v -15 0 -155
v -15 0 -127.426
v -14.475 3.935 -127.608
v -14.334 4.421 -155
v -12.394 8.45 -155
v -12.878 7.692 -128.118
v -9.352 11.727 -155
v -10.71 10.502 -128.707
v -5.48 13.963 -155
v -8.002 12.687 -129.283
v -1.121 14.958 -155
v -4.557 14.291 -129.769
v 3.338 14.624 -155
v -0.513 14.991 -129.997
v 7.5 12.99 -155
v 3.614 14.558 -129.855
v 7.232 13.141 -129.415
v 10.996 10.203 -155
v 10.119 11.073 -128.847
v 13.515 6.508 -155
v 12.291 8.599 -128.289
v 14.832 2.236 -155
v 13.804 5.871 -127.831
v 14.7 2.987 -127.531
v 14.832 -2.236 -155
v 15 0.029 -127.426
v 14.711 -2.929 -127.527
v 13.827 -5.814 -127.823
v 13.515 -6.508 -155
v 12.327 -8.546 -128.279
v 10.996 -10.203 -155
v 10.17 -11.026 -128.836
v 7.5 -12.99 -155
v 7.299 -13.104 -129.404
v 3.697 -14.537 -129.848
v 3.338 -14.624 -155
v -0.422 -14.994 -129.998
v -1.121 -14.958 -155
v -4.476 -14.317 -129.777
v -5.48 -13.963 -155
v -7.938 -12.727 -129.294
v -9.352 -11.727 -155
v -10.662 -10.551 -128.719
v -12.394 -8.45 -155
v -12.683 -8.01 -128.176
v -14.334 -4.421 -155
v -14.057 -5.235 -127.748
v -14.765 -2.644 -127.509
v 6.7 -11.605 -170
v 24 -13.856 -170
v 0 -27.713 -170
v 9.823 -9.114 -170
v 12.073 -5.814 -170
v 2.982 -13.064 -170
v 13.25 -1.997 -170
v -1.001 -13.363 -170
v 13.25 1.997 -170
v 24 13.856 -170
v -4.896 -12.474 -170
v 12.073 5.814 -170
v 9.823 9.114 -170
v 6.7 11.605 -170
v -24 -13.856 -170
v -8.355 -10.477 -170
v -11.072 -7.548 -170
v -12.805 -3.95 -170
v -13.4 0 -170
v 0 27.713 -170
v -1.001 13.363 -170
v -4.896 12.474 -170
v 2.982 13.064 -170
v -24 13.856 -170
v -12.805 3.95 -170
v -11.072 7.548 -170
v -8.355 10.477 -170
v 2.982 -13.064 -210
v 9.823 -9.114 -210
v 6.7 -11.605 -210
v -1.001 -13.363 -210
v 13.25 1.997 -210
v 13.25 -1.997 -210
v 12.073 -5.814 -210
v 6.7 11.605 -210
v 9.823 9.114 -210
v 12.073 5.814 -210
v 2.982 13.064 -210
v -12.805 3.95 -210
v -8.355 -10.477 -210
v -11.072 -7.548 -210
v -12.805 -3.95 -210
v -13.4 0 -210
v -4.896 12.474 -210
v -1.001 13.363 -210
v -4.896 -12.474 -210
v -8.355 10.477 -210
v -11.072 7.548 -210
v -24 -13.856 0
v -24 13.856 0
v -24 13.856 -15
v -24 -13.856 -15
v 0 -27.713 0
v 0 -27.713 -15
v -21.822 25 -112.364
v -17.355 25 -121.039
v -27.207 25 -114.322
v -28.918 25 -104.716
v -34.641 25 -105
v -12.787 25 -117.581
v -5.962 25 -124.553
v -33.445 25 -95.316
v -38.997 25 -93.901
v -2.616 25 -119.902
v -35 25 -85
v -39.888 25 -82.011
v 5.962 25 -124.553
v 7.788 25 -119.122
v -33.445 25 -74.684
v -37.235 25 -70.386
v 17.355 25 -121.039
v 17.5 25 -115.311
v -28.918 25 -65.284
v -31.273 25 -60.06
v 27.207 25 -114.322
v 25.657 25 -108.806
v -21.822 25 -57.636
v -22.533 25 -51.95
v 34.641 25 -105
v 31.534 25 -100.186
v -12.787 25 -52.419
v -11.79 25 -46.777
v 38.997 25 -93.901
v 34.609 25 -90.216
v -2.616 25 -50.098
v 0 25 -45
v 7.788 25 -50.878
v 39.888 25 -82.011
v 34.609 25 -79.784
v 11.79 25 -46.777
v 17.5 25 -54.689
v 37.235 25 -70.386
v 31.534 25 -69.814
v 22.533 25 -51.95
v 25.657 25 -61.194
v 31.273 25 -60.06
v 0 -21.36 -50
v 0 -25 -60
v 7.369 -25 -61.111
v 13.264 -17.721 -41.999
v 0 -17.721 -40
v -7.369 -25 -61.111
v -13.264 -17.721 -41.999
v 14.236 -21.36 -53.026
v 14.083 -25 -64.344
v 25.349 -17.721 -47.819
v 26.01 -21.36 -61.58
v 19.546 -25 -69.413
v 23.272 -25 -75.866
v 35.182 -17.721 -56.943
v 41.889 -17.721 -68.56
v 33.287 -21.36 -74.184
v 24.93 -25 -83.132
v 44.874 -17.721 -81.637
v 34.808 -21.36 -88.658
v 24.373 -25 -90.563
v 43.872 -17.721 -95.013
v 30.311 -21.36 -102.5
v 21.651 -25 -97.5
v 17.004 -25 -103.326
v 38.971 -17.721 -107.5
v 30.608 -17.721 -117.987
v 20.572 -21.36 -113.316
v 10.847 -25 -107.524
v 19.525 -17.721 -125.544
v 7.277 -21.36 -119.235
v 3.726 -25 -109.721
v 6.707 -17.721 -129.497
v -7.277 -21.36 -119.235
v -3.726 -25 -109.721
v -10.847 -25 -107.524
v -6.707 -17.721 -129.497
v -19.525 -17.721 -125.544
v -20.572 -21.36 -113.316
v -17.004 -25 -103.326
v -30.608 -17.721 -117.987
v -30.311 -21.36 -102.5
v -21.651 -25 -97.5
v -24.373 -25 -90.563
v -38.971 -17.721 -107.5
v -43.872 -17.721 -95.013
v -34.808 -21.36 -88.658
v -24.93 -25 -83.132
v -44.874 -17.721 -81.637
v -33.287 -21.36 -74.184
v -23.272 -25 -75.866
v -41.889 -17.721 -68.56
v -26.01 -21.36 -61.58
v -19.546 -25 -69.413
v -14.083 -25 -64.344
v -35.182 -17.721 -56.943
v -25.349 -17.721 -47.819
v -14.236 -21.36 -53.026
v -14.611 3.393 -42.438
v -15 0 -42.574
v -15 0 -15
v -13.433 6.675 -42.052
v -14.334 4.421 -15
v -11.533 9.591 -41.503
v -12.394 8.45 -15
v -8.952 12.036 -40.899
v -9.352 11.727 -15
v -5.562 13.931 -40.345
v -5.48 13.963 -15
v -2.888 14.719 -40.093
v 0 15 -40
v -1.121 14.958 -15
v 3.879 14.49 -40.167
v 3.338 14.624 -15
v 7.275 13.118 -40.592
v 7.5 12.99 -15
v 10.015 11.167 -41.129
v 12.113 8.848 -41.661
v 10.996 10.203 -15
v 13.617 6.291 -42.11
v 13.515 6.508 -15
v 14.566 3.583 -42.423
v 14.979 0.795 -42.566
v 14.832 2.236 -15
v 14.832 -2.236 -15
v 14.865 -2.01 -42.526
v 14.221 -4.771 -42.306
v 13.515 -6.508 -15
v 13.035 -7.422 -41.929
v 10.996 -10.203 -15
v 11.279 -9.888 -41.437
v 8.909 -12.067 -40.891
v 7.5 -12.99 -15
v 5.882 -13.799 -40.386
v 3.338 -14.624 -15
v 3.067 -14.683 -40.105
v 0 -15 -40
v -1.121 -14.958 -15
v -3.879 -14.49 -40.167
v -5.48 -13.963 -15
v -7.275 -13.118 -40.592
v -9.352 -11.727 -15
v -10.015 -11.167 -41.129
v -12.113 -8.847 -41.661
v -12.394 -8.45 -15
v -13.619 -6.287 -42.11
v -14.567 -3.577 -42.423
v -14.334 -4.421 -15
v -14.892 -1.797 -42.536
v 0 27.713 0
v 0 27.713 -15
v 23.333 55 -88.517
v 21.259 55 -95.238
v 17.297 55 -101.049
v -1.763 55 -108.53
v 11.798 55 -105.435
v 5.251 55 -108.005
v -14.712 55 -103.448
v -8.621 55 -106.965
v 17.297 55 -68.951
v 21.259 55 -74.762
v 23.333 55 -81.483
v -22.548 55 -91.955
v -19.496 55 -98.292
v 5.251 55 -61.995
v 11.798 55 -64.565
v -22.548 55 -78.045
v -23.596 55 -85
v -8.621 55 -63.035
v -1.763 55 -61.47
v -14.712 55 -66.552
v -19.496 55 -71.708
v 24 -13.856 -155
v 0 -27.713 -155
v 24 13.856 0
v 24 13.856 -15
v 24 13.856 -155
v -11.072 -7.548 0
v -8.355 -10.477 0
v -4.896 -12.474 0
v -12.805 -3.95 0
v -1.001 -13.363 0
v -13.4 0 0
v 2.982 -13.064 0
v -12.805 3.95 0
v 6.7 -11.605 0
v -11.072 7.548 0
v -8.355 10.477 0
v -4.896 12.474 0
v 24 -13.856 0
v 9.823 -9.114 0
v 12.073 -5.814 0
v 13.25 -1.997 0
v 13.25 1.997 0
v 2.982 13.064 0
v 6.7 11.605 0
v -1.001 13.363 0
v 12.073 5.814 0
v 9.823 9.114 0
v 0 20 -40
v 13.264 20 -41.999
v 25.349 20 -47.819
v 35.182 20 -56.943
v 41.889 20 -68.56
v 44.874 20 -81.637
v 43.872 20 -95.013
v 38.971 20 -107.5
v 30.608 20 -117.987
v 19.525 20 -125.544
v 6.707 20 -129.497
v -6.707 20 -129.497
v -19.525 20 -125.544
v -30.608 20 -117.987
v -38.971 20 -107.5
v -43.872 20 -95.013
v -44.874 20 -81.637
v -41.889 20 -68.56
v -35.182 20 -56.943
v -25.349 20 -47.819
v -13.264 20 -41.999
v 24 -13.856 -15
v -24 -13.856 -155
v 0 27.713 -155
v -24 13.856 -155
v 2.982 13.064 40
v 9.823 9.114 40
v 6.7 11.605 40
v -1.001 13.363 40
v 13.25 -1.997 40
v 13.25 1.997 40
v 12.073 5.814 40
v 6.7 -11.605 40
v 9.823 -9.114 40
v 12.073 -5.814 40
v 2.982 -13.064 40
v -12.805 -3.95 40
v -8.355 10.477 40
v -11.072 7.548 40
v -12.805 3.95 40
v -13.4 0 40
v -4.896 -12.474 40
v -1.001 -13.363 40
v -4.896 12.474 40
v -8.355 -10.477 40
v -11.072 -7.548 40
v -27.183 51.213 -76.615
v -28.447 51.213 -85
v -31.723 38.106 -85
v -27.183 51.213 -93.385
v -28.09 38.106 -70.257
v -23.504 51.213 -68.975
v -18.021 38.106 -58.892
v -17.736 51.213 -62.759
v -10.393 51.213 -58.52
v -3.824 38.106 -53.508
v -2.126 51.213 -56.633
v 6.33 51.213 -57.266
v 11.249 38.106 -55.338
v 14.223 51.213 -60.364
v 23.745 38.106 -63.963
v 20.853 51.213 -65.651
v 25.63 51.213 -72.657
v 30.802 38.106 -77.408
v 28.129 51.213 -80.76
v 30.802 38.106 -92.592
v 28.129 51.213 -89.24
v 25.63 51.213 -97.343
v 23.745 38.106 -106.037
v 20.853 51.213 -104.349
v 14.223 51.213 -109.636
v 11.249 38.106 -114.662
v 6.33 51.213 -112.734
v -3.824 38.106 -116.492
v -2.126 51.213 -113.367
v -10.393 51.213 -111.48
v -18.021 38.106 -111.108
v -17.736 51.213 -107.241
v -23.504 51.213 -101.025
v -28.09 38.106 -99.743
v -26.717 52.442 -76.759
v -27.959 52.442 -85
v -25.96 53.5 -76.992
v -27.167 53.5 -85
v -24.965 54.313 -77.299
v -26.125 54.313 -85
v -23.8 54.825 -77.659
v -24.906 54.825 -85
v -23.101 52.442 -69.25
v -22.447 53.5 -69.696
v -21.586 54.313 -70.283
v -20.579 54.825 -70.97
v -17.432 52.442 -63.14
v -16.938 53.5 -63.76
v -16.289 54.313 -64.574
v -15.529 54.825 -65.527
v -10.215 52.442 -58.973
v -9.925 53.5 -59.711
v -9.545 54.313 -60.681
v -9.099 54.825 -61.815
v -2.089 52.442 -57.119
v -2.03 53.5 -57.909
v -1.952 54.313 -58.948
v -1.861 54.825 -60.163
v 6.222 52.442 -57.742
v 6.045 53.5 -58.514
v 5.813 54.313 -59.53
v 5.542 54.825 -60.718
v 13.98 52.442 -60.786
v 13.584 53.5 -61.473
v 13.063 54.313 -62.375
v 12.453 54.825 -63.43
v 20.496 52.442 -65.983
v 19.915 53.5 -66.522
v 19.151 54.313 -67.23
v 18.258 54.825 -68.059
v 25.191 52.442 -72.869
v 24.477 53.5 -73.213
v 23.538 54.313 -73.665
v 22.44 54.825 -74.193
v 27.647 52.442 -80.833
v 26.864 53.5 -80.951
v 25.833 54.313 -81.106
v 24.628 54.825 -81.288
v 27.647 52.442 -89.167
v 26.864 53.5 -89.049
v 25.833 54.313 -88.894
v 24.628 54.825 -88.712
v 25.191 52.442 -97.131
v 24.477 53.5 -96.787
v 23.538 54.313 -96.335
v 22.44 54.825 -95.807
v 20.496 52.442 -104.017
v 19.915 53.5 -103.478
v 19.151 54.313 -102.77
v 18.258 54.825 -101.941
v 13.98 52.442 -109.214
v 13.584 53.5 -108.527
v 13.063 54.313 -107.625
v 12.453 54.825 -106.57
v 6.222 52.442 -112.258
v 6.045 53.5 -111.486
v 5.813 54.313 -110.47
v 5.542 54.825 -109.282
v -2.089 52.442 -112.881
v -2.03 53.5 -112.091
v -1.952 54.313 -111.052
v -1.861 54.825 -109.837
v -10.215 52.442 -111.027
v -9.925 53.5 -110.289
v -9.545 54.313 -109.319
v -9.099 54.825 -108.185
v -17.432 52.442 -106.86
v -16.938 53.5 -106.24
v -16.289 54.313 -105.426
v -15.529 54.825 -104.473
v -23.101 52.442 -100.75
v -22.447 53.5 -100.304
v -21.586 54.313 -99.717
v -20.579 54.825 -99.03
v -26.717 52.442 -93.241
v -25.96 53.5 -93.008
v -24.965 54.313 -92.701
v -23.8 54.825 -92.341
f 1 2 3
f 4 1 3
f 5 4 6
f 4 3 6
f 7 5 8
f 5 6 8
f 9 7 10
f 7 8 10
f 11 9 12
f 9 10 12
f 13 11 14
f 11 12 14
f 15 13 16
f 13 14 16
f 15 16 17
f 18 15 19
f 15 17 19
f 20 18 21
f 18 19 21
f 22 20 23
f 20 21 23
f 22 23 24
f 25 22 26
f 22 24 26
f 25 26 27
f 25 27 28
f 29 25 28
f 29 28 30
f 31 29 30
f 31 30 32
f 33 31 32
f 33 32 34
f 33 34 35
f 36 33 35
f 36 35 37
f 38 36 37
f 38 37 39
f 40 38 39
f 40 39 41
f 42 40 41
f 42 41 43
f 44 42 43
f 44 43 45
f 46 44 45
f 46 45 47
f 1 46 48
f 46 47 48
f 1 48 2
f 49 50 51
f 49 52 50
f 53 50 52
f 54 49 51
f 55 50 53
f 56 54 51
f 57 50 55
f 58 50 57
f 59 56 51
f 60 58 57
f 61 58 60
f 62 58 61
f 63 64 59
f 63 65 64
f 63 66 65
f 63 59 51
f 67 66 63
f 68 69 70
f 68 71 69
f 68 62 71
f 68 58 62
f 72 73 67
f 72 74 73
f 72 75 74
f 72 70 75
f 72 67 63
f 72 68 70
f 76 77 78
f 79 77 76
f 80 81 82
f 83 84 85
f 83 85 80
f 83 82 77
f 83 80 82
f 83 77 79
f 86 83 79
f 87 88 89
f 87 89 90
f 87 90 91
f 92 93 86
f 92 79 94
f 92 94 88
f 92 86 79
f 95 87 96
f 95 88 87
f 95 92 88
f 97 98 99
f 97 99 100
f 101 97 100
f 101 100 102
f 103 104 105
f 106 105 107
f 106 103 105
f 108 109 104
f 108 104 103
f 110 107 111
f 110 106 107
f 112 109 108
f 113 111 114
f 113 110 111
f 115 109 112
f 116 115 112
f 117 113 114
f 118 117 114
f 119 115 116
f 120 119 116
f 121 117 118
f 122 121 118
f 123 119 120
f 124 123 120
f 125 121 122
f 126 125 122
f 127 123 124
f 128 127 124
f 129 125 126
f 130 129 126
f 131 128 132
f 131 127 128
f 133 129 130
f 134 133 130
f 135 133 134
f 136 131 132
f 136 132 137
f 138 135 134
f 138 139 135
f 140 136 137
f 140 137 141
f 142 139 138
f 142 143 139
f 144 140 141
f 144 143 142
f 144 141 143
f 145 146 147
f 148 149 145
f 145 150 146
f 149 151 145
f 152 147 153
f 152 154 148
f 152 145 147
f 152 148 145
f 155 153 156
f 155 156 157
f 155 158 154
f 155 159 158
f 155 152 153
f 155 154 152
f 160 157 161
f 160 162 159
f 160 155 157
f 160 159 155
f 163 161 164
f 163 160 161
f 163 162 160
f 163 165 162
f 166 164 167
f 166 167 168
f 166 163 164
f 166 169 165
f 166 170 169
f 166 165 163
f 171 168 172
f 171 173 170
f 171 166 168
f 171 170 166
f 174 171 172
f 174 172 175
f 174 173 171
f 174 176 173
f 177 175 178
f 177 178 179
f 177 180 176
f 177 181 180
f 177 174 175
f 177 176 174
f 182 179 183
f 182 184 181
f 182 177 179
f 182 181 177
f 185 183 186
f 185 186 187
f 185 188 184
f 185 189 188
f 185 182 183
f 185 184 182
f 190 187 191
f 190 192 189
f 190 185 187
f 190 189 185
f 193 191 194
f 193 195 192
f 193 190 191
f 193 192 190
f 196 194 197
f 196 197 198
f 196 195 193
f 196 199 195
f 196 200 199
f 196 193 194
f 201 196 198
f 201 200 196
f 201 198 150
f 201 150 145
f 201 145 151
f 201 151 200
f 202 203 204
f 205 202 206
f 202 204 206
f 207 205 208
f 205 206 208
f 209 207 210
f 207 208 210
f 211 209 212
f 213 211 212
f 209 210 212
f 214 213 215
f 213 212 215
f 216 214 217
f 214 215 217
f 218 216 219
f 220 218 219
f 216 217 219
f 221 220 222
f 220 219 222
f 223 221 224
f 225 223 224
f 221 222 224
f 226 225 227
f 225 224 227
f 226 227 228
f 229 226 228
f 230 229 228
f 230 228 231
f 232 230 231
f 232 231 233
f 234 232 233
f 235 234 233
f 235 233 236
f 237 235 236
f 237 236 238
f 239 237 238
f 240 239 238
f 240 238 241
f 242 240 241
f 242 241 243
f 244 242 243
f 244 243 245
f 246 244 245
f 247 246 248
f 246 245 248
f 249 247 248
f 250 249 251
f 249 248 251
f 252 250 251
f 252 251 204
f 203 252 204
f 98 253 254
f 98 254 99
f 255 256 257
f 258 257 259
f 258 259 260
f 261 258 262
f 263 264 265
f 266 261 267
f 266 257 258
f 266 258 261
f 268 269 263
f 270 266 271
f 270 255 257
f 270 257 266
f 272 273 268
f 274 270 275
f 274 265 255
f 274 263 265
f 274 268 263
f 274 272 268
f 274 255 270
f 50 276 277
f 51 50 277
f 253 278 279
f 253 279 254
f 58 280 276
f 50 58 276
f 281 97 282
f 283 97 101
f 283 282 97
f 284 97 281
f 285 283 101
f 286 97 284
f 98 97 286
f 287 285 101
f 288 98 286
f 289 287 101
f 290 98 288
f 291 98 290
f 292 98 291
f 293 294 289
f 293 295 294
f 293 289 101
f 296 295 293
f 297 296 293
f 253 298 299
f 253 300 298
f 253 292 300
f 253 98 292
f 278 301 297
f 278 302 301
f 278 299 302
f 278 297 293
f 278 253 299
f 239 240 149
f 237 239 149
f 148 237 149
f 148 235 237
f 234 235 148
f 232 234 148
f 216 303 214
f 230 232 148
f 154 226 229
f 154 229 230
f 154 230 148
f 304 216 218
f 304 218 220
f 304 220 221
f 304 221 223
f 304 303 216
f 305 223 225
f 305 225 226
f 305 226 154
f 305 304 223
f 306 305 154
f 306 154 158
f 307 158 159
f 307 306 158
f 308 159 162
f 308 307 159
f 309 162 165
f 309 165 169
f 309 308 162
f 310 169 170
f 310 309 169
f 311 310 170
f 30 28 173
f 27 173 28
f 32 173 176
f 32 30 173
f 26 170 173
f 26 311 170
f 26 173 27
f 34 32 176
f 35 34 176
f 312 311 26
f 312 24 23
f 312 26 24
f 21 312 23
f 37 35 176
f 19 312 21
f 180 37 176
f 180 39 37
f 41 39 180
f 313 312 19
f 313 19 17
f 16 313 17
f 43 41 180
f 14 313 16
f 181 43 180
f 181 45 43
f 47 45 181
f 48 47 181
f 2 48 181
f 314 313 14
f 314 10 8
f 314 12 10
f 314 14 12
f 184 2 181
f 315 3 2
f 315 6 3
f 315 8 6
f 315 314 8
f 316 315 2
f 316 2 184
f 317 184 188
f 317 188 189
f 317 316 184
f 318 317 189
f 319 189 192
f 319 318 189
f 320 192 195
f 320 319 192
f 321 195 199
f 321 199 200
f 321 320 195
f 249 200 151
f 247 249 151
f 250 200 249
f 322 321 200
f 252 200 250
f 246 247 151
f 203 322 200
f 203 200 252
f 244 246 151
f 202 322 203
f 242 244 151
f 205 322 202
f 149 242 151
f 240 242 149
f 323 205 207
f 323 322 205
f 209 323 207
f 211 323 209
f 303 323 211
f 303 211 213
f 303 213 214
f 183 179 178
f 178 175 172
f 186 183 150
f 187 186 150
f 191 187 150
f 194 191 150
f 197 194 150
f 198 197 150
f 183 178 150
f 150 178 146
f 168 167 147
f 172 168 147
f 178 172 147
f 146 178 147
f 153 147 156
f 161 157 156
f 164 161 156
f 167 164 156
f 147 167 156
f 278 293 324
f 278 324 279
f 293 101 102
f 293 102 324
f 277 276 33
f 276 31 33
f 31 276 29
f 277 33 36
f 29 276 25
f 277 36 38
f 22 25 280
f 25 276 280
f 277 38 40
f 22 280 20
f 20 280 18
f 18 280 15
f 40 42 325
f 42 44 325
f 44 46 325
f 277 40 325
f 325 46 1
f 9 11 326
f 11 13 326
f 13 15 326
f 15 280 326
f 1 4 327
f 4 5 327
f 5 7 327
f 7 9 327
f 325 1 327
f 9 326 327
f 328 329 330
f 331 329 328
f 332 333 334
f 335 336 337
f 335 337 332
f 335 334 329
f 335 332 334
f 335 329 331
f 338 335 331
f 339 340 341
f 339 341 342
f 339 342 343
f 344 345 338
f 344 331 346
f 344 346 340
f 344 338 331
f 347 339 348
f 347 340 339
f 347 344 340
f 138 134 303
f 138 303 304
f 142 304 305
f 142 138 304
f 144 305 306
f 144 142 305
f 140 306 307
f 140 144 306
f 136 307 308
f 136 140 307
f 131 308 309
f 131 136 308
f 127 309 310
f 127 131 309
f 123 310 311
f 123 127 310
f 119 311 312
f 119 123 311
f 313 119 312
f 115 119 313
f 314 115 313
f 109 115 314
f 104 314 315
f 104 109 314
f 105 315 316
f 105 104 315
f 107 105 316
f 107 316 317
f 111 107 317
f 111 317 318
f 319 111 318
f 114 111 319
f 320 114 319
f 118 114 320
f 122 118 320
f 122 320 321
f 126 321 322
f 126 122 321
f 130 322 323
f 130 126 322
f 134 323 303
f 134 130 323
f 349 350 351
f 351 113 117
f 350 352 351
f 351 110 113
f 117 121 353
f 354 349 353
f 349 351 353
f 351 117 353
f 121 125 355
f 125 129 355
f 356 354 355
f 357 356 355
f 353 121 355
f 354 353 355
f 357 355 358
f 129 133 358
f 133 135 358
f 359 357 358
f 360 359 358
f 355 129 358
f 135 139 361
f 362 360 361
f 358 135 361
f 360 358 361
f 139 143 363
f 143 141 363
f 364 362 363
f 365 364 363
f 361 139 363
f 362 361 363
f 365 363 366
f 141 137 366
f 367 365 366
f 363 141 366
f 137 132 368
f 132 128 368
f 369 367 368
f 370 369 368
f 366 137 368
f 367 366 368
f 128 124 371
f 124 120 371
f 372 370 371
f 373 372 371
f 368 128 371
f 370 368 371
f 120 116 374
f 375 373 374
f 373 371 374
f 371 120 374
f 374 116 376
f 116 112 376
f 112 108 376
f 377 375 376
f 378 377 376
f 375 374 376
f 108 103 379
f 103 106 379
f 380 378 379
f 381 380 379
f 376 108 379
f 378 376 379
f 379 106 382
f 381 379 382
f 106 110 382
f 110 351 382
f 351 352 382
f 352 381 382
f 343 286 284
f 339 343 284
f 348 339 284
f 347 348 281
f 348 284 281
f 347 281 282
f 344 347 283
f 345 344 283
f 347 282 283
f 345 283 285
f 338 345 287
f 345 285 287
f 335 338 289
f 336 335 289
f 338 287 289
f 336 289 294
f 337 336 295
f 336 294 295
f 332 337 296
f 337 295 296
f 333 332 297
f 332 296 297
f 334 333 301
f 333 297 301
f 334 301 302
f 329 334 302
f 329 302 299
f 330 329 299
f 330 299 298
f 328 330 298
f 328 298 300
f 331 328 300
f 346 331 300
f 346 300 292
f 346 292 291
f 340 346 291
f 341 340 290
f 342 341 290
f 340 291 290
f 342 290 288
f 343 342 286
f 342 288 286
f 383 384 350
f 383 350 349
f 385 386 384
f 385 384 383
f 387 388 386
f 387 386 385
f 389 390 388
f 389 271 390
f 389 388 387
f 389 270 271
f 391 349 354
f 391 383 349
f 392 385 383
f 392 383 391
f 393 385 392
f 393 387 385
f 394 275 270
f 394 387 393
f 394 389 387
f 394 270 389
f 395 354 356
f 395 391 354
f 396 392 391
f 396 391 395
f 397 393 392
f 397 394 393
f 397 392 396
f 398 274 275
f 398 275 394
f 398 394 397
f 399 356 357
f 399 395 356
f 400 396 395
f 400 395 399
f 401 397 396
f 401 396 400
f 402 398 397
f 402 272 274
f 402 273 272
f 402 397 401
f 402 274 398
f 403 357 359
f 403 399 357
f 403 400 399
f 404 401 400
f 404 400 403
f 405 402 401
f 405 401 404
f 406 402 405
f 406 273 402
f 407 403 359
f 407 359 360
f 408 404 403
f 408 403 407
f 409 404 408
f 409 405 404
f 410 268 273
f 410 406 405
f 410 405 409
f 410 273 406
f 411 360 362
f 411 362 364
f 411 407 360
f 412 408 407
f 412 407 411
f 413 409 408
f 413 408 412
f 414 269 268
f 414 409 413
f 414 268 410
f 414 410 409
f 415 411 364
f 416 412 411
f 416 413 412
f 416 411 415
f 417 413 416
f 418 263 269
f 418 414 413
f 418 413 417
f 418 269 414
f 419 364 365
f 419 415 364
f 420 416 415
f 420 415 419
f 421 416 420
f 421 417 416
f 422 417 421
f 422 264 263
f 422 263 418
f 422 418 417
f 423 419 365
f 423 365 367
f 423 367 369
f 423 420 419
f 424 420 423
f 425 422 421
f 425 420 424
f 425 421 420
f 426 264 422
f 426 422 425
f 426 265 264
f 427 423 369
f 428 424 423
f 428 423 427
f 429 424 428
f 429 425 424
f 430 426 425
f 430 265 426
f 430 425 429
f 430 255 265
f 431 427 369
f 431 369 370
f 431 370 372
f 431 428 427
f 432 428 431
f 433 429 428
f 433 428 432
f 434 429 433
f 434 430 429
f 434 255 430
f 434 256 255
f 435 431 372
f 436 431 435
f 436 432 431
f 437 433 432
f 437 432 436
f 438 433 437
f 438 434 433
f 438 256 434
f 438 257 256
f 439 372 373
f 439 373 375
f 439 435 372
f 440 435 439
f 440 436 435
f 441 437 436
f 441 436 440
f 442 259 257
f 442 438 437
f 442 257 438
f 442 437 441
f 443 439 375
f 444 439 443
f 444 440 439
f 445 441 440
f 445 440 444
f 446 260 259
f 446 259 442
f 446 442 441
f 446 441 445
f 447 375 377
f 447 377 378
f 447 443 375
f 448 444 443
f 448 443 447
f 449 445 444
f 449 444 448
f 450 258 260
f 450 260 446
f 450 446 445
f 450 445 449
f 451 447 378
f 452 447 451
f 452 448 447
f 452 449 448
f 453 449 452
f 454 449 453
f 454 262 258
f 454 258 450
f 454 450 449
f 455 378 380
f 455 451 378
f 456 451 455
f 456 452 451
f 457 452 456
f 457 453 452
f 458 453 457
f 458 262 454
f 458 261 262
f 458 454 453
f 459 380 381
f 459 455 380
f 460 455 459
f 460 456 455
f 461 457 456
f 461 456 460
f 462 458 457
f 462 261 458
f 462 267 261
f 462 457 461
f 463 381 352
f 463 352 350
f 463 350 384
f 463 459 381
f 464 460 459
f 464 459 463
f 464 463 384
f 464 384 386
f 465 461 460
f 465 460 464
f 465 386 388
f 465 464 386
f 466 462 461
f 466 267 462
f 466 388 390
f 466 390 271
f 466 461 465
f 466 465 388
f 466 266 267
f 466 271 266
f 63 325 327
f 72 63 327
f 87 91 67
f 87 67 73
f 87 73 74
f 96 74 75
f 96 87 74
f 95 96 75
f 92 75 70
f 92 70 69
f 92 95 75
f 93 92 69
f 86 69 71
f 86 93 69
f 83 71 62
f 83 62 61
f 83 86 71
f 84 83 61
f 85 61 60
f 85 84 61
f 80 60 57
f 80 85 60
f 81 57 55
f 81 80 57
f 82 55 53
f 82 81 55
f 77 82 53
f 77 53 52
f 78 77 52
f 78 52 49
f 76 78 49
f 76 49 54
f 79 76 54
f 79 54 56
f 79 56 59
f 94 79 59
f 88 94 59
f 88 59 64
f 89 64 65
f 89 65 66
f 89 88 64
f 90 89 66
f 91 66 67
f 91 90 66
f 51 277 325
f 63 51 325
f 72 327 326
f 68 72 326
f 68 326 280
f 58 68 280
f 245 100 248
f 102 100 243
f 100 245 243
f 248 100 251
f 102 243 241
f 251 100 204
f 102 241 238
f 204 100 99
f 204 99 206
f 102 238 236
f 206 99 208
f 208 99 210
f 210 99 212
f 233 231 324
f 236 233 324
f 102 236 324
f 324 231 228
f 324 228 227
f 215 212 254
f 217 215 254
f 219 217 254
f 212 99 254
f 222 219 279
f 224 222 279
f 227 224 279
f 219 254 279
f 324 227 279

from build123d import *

# Parameters (mm, degrees)
EXTRUDE_324_DEPTH = 15
SKETCH_2_R        = 15
EXTRUDE_1_DEPTH   = 140
EXTRUDE_2_DEPTH   = 15
SKETCH_4_R        = 13.4
EXTRUDE_3_DEPTH   = 40
EXTRUDE_START     = 40
SKETCH_5_R        = 13.4
EXTRUDE_4_DEPTH   = 40
SKETCH_6_R        = 45
EXTRUDE_5_DEPTH   = 25
CHAMFER_1_SIZE    = 20
CHAMFER_1_SIZE2   = 7.279404685
CHAMFER_2_SIZE    = 5
SKETCH_7_R        = 27.5
SKETCH_8_R        = 35
FILLET_1_R        = 5


with BuildPart() as part:
    # Эскиз1 → Extrude 324 (new body)
    with BuildSketch(Plane.XY):
        Polygon((0, 27.712812921), (-24, 13.856406461), (-24, -13.856406461), (0, -27.712812921), (24, -13.856406461), (24, 13.856406461), align=None)
    extrude(amount=-EXTRUDE_324_DEPTH)

    # Эскиз2 → Бобышка-Вытянуть1 (add)
    with BuildSketch(Plane(origin=(0, 0, -15), x_dir=(-1, 0, 0), z_dir=(0, 0, -1))):
        Circle(SKETCH_2_R)
    extrude(amount=EXTRUDE_1_DEPTH)

    # Эскиз3 → Бобышка-Вытянуть2 (add)
    with BuildSketch(Plane(origin=(0, 0, -155), x_dir=(-1, 0, 0), z_dir=(0, 0, -1))):
        Polygon((0, 27.712812921), (-24, 13.856406461), (-24, -13.856406461), (0, -27.712812921), (24, -13.856406461), (24, 13.856406461), align=None)
    extrude(amount=EXTRUDE_2_DEPTH)

    # Эскиз4 → Бобышка-Вытянуть3 (add)
    with BuildSketch(Plane.XY):
        with Locations(Location((0, 0, 0), (0, 0, 180))):
            Circle(SKETCH_4_R)
    extrude(amount=EXTRUDE_3_DEPTH)

    # Эскиз5 → Бобышка-Вытянуть4 (add)
    with BuildSketch(Plane(origin=(0, 0, -170), x_dir=(-1, 0, 0), z_dir=(0, 0, -1)).offset(EXTRUDE_START)):
        Circle(SKETCH_5_R)
    extrude(amount=-EXTRUDE_4_DEPTH)

    # Эскиз6 → Бобышка-Вытянуть5 (add, symmetric)
    with BuildSketch(Plane(origin=(0, 0, 0), x_dir=(1, 0, 0), z_dir=(0, 1, 0))):
        with Locations(Location((0, 85, 0), (0, 0, 270))):
            Circle(SKETCH_6_R)
    extrude(amount=EXTRUDE_5_DEPTH, both=True)

    # Фаска1
    chamfer_1_edges = [part.edges().sort_by_distance(p)[0] for p in [
        (0, -25, -130),
    ]]
    chamfer_1_side = [part.faces().sort_by_distance(p)[0] for p in [
        (0, -25, -85),
    ]]
    chamfer(chamfer_1_edges, length=CHAMFER_1_SIZE, length2=CHAMFER_1_SIZE2, reference=chamfer_1_side[0])

    # Фаска2
    chamfer_2_edges = [part.edges().sort_by_distance(p)[0] for p in [
        (0, 25, -130),
    ]]
    chamfer(chamfer_2_edges, length=CHAMFER_2_SIZE)

    # Эскиз7 → Бобышка-По сечениям1 section 0
    with BuildSketch(Plane(origin=(0, 55, 0), x_dir=(-1, 0, 0), z_dir=(0, 1, 0))):
        with Locations((0, -85)):
            Circle(SKETCH_7_R)
    # Эскиз8 → Бобышка-По сечениям1 section 1
    with BuildSketch(Plane(origin=(0, 25, 0), x_dir=(-1, 0, 0), z_dir=(0, 1, 0))):
        with Locations((0, -85)):
            Circle(SKETCH_8_R)
    loft()

    # Скругление1
    fillet_1_edges = [part.edges().sort_by_distance(p)[0] for p in [
        (27.5, 55, -85),
    ]]
    fillet(fillet_1_edges, radius=FILLET_1_R)


solid = part.part
